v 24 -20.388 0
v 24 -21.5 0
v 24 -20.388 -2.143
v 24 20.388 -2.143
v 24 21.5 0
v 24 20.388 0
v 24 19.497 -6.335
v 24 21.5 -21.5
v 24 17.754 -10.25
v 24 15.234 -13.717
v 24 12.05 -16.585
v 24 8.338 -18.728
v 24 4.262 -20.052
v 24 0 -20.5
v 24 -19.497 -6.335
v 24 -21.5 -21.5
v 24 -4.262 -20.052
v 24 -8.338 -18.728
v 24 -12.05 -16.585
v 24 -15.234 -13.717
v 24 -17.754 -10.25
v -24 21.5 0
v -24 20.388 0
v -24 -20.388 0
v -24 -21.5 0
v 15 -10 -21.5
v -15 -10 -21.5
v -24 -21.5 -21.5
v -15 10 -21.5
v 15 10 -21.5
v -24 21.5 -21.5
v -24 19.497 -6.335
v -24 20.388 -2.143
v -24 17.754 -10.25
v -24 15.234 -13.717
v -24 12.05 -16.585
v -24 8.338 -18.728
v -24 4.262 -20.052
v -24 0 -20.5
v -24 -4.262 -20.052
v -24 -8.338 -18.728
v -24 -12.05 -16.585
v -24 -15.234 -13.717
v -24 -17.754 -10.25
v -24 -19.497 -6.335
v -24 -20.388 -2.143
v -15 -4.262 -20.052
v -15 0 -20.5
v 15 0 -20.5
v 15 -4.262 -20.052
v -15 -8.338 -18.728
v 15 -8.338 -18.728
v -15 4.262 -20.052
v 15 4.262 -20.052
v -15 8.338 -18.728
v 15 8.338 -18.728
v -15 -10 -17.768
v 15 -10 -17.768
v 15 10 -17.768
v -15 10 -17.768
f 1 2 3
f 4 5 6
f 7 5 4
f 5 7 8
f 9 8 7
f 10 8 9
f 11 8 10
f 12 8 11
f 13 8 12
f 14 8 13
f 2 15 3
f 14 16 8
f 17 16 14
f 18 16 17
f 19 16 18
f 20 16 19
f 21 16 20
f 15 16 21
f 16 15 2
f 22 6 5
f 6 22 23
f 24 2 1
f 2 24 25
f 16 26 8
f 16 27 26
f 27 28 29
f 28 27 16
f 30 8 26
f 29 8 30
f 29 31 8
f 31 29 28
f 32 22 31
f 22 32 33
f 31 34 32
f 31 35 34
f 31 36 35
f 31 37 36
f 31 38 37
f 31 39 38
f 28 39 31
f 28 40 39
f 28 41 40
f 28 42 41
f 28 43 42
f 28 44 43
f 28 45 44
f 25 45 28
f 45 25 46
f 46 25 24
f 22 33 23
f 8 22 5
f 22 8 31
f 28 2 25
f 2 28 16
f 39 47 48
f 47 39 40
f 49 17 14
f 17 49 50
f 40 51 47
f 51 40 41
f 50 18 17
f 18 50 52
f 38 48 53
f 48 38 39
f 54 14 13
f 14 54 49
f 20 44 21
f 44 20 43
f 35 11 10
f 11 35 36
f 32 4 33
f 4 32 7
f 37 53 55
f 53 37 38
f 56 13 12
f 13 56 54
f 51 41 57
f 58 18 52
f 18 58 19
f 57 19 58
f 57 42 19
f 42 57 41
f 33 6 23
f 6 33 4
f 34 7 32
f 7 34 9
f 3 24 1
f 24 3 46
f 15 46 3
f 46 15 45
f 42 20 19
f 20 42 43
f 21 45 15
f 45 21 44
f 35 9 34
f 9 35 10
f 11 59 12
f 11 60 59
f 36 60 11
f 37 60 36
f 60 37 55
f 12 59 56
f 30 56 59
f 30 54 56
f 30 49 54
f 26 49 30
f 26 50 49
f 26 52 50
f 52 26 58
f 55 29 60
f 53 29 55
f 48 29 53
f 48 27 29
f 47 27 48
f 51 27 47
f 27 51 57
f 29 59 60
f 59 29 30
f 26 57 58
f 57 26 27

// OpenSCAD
/* vim: set ai et ts=4 sw=4: */
// http://www.openscad.org/cheatsheet/

big_dia = 41;
small_dia = 41;
length = 50; // the real length willi be `length-tickness`
thickness = 2;

swtich_offset = 0; // from the center in the direction of small_dia
switch_lenth = 30;
switch_width = 20;
switch_depth = big_dia/2;

difference() {
    translate([0, 0, -(big_dia+thickness)/4])
      cube([length-thickness, big_dia+thickness, (big_dia+thickness)/2],center = true);

    rotate([0, 90, 0])
      cylinder(h = length, d1 = big_dia, d2 = small_dia, center = true);

    translate([swtich_offset, 0, -small_dia/2])
        cube([switch_lenth, switch_width, switch_depth], center = true);
}
